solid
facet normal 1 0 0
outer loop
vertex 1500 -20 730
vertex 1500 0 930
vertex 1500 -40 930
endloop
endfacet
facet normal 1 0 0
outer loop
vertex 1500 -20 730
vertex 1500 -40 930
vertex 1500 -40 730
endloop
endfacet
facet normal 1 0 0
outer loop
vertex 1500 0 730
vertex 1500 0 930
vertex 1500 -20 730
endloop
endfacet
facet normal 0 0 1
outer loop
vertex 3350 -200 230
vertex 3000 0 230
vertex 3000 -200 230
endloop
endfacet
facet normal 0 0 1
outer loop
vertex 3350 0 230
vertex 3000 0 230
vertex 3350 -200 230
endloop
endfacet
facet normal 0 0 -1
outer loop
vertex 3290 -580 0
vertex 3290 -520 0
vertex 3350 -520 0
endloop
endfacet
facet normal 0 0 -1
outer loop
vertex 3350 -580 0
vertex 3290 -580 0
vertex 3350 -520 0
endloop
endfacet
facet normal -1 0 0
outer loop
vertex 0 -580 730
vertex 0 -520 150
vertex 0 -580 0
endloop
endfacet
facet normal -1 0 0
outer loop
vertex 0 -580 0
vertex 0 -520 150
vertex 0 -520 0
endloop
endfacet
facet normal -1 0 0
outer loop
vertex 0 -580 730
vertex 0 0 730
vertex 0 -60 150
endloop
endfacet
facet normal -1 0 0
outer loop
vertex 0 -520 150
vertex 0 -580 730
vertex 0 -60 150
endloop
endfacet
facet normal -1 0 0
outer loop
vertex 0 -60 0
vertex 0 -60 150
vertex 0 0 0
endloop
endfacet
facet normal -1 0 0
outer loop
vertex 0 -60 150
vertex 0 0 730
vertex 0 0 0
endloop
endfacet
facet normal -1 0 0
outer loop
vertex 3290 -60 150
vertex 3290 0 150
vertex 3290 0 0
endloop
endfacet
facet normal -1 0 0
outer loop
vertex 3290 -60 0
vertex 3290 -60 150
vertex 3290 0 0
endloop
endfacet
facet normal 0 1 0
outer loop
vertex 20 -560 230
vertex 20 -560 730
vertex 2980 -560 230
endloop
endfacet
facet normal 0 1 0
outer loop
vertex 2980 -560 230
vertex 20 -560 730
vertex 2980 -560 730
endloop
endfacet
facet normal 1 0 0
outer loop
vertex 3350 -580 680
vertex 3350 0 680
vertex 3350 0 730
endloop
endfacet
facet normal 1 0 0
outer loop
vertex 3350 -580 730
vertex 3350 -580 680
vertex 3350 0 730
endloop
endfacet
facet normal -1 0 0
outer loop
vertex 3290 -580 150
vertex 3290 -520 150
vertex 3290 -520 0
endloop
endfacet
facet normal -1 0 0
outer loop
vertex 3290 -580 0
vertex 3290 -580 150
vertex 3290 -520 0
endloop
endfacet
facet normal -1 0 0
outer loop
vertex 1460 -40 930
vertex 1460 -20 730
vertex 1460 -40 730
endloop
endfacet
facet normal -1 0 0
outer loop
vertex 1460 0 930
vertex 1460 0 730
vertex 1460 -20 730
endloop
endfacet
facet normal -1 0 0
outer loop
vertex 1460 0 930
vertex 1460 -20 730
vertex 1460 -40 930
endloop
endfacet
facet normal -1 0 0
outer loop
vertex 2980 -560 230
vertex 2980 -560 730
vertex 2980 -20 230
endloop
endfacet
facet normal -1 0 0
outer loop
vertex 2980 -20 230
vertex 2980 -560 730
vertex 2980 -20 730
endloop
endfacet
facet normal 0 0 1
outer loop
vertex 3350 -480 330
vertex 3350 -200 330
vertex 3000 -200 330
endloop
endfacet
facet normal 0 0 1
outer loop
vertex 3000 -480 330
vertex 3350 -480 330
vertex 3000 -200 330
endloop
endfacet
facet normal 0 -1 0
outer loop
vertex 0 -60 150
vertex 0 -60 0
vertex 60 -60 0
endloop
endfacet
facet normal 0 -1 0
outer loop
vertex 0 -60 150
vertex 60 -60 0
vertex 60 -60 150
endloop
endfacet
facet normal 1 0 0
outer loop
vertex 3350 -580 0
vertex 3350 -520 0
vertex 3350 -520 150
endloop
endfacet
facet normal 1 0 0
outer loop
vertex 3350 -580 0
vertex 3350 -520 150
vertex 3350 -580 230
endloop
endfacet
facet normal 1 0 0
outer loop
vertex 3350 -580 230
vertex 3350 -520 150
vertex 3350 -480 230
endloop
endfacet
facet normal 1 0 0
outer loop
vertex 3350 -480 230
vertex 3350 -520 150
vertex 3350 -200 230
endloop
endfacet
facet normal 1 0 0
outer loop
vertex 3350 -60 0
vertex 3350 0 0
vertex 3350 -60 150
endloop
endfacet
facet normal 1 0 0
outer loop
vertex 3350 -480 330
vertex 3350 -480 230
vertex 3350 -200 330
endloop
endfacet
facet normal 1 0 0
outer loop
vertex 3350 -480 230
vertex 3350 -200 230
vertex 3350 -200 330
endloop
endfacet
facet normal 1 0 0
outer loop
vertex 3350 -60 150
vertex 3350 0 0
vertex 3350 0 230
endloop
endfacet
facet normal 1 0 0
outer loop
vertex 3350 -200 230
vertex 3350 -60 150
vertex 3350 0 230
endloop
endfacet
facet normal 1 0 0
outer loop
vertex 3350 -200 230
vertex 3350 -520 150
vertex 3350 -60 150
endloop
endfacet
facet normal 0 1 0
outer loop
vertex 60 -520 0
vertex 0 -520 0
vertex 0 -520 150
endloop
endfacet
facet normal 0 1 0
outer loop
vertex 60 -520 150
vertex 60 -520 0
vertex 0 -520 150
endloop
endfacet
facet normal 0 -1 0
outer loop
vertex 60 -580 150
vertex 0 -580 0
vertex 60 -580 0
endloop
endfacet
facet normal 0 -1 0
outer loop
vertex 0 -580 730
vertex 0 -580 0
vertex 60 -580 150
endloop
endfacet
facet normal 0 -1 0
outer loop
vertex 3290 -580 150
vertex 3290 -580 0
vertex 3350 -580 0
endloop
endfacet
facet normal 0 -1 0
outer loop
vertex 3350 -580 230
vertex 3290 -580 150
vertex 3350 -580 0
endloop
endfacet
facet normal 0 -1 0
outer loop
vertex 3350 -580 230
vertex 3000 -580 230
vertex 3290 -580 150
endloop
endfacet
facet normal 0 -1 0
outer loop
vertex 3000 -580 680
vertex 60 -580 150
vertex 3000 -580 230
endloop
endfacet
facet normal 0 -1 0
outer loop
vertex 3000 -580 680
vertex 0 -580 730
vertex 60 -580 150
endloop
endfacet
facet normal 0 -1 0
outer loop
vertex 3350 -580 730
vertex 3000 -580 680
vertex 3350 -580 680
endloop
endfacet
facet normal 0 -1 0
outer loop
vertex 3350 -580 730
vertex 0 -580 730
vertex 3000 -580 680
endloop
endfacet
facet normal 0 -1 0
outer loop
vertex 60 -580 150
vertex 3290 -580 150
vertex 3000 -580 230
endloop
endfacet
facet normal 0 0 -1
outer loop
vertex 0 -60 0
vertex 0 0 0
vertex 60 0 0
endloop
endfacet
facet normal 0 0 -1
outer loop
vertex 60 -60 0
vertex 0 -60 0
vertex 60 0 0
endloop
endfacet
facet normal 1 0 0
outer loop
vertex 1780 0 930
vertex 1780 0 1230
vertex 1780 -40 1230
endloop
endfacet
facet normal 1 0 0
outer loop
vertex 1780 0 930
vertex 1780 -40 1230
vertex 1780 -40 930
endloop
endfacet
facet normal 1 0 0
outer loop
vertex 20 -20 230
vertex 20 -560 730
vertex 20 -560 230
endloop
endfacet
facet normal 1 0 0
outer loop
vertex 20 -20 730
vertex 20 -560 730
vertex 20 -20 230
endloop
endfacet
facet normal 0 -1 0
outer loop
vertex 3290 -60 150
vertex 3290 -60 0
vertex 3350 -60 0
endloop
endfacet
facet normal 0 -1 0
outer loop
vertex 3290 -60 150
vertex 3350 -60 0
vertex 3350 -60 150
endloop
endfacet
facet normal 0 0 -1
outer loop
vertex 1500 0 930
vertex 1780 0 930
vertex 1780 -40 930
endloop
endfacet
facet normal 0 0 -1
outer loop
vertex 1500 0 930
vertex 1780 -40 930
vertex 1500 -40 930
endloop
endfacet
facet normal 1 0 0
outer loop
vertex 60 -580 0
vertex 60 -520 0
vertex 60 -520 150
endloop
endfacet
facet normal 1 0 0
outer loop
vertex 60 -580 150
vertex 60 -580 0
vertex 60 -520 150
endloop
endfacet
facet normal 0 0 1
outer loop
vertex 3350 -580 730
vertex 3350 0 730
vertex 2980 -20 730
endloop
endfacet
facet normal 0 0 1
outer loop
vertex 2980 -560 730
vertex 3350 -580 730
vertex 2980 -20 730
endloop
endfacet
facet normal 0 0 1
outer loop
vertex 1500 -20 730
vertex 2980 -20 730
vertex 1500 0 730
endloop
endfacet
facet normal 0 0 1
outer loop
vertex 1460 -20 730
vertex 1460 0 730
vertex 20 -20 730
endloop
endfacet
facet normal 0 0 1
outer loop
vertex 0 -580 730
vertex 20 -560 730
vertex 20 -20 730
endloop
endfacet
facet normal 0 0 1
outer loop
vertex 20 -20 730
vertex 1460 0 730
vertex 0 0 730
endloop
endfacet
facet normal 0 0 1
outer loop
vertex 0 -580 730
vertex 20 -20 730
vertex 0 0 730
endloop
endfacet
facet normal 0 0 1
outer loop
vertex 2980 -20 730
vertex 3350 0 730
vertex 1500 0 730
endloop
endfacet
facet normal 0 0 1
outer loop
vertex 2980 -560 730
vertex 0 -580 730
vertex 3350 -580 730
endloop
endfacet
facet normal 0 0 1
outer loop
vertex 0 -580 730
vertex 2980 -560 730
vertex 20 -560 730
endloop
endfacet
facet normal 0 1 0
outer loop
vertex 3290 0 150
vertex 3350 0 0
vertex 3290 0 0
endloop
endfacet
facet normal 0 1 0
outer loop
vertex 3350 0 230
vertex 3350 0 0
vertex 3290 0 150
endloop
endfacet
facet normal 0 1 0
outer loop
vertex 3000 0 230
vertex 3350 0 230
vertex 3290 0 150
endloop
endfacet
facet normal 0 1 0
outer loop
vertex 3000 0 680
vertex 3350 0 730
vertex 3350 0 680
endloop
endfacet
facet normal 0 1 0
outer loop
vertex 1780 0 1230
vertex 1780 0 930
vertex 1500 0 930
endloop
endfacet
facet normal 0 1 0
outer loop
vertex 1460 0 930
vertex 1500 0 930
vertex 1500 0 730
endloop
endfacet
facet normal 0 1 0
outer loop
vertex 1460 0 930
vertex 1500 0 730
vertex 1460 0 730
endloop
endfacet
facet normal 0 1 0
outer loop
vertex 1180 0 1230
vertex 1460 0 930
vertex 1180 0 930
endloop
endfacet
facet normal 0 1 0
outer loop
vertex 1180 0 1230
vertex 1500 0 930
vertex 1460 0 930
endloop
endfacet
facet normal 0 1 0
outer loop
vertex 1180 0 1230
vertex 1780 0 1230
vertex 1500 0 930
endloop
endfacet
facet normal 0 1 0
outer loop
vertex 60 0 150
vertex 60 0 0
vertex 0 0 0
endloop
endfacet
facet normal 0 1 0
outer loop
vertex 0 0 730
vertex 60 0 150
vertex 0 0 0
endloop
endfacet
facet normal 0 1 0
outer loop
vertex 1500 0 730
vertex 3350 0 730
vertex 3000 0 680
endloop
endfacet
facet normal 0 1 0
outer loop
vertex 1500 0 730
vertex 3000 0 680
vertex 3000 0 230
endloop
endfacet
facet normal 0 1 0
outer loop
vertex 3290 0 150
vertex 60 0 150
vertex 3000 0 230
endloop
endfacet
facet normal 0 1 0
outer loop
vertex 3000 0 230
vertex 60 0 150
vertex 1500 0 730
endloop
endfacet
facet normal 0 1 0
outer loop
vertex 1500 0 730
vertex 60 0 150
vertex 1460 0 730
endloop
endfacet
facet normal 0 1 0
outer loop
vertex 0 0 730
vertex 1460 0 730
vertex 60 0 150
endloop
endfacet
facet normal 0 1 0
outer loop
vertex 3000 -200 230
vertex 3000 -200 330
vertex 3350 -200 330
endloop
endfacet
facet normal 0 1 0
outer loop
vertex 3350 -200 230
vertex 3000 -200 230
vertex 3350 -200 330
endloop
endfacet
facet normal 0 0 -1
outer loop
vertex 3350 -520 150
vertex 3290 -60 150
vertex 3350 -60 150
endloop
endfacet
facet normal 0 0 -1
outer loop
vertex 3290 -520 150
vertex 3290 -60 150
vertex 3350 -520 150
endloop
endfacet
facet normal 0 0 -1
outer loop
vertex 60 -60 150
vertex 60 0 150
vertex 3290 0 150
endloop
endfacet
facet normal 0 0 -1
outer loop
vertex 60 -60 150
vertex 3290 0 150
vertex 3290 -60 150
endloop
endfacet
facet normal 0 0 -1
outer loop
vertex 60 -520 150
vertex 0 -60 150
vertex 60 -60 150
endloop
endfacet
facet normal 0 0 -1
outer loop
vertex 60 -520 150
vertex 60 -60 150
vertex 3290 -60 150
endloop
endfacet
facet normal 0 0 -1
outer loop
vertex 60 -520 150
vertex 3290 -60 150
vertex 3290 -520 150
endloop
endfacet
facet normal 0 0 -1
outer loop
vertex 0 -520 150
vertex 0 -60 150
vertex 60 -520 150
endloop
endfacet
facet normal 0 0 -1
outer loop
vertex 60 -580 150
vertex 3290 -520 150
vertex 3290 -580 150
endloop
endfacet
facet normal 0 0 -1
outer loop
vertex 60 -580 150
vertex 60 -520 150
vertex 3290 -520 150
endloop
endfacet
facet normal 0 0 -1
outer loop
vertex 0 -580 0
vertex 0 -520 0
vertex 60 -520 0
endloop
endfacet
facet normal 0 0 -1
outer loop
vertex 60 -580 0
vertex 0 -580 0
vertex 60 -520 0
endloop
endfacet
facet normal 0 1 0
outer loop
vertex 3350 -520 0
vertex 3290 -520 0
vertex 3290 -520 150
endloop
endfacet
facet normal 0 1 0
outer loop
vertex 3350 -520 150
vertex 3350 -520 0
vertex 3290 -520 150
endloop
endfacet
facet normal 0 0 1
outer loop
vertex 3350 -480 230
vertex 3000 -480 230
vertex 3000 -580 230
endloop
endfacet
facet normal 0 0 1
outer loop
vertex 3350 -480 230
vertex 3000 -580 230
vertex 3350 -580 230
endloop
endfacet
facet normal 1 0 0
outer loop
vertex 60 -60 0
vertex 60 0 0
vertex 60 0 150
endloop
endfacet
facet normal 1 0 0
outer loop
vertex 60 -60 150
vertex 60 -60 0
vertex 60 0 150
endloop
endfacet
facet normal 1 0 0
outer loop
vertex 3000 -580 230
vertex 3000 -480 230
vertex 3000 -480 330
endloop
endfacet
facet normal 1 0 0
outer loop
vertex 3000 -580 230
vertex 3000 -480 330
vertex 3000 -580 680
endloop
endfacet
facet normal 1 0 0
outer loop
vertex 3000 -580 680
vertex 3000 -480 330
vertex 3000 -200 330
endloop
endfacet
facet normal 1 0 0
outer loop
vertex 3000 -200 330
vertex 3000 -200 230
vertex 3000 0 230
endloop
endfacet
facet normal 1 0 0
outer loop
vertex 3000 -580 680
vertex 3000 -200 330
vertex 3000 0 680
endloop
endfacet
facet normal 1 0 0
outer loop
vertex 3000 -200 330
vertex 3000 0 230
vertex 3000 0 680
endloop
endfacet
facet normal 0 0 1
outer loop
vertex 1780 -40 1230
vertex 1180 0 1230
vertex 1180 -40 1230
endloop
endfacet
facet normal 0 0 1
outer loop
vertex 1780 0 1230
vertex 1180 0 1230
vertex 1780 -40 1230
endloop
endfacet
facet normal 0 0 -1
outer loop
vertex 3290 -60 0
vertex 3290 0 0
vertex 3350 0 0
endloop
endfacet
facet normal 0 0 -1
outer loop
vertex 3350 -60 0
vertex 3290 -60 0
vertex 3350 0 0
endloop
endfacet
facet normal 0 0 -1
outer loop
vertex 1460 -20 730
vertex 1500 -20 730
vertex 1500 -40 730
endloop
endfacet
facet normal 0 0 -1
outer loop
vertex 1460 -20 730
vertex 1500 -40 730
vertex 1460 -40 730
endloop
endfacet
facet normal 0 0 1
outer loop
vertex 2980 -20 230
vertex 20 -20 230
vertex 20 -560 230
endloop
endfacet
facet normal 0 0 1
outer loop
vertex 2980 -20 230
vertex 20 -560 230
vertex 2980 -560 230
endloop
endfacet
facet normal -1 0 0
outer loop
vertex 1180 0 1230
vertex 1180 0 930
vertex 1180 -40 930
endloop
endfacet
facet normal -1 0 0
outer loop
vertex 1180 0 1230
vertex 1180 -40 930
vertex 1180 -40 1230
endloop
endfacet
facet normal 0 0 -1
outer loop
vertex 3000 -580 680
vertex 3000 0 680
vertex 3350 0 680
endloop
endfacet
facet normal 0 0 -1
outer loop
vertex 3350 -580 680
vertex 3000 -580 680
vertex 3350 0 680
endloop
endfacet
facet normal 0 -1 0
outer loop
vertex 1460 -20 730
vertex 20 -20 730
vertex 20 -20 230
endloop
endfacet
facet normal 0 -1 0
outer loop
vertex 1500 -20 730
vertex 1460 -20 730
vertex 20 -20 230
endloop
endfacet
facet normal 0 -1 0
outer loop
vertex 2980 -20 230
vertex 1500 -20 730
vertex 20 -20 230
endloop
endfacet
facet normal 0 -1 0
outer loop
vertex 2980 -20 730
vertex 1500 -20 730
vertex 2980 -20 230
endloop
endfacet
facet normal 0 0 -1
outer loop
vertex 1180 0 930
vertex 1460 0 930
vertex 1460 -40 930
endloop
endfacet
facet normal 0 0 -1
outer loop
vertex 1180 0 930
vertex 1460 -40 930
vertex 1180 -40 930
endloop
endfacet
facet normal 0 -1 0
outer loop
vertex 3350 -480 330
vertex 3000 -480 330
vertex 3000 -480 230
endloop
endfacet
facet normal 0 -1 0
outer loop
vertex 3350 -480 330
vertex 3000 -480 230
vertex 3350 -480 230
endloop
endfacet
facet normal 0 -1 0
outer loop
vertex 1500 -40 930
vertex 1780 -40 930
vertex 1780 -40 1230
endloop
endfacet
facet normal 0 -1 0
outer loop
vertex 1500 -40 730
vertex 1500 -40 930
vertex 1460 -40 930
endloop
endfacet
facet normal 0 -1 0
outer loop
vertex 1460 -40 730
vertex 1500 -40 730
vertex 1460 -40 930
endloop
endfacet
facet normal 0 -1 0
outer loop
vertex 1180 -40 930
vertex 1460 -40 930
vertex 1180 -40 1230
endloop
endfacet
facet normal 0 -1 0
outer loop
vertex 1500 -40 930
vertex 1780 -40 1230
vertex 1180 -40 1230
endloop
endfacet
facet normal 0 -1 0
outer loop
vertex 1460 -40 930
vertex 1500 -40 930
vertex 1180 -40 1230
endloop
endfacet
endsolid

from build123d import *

# Parameters (mm, degrees)
F1_DEPTH = 580
F2_W     = 460
F2_H     = 150
F3_DEPTH = 3350.001
F4_W     = 2960
F4_H     = 540
F5_DEPTH = 500
F6_W     = 350
F6_H     = 100
F6_H_2   = 200
F7_DEPTH = 100
F9_DEPTH = 40


with BuildPart() as f1:
    # F0 (on Front) → F1 (new body)
    with BuildSketch(Plane.XZ):
        Polygon((0, 730), (0, 0), (60, 0), (60, 150), (3290, 150), (3290, 0), (3350, 0), (3350, 330), (3000, 330), (3000, 680), (3350, 680), (3350, 730), align=None)
    extrude(amount=F1_DEPTH)

    # F2 (on face) → F3 (cut, through all)
    with BuildSketch(Plane(origin=(0, 0, 0), x_dir=(0, -1, 0), z_dir=(-1, 0, 0))):
        with Locations((290, 75)):
            Rectangle(F2_W, F2_H)
    extrude(amount=-F3_DEPTH, mode=Mode.SUBTRACT)

    # F4 (on face) → F5 (cut)
    with BuildSketch(Plane.XY.offset(730)):
        with Locations((1500, -290)):
            Rectangle(F4_W, F4_H)
    extrude(amount=-F5_DEPTH, mode=Mode.SUBTRACT)

    # F6 (on face) → F7 (cut)
    with BuildSketch(Plane.XY.offset(330)):
        with Locations((3175, -530)):
            Rectangle(F6_W, F6_H)
        with Locations((3175, -100)):
            Rectangle(F6_W, F6_H_2)
    extrude(amount=-F7_DEPTH, mode=Mode.SUBTRACT)

    # F8 (on face) → F9 (join)
    with BuildSketch(Plane(origin=(0, 0, 0), x_dir=(-1, 0, 0), z_dir=(0, 1, 0))):
        Polygon((-1500, 930), (-1500, 730), (-1460, 730), (-1460, 930), (-1180, 930), (-1180, 1230), (-1780, 1230), (-1780, 930), align=None)
    extrude(amount=-F9_DEPTH)


solid = f1.part
